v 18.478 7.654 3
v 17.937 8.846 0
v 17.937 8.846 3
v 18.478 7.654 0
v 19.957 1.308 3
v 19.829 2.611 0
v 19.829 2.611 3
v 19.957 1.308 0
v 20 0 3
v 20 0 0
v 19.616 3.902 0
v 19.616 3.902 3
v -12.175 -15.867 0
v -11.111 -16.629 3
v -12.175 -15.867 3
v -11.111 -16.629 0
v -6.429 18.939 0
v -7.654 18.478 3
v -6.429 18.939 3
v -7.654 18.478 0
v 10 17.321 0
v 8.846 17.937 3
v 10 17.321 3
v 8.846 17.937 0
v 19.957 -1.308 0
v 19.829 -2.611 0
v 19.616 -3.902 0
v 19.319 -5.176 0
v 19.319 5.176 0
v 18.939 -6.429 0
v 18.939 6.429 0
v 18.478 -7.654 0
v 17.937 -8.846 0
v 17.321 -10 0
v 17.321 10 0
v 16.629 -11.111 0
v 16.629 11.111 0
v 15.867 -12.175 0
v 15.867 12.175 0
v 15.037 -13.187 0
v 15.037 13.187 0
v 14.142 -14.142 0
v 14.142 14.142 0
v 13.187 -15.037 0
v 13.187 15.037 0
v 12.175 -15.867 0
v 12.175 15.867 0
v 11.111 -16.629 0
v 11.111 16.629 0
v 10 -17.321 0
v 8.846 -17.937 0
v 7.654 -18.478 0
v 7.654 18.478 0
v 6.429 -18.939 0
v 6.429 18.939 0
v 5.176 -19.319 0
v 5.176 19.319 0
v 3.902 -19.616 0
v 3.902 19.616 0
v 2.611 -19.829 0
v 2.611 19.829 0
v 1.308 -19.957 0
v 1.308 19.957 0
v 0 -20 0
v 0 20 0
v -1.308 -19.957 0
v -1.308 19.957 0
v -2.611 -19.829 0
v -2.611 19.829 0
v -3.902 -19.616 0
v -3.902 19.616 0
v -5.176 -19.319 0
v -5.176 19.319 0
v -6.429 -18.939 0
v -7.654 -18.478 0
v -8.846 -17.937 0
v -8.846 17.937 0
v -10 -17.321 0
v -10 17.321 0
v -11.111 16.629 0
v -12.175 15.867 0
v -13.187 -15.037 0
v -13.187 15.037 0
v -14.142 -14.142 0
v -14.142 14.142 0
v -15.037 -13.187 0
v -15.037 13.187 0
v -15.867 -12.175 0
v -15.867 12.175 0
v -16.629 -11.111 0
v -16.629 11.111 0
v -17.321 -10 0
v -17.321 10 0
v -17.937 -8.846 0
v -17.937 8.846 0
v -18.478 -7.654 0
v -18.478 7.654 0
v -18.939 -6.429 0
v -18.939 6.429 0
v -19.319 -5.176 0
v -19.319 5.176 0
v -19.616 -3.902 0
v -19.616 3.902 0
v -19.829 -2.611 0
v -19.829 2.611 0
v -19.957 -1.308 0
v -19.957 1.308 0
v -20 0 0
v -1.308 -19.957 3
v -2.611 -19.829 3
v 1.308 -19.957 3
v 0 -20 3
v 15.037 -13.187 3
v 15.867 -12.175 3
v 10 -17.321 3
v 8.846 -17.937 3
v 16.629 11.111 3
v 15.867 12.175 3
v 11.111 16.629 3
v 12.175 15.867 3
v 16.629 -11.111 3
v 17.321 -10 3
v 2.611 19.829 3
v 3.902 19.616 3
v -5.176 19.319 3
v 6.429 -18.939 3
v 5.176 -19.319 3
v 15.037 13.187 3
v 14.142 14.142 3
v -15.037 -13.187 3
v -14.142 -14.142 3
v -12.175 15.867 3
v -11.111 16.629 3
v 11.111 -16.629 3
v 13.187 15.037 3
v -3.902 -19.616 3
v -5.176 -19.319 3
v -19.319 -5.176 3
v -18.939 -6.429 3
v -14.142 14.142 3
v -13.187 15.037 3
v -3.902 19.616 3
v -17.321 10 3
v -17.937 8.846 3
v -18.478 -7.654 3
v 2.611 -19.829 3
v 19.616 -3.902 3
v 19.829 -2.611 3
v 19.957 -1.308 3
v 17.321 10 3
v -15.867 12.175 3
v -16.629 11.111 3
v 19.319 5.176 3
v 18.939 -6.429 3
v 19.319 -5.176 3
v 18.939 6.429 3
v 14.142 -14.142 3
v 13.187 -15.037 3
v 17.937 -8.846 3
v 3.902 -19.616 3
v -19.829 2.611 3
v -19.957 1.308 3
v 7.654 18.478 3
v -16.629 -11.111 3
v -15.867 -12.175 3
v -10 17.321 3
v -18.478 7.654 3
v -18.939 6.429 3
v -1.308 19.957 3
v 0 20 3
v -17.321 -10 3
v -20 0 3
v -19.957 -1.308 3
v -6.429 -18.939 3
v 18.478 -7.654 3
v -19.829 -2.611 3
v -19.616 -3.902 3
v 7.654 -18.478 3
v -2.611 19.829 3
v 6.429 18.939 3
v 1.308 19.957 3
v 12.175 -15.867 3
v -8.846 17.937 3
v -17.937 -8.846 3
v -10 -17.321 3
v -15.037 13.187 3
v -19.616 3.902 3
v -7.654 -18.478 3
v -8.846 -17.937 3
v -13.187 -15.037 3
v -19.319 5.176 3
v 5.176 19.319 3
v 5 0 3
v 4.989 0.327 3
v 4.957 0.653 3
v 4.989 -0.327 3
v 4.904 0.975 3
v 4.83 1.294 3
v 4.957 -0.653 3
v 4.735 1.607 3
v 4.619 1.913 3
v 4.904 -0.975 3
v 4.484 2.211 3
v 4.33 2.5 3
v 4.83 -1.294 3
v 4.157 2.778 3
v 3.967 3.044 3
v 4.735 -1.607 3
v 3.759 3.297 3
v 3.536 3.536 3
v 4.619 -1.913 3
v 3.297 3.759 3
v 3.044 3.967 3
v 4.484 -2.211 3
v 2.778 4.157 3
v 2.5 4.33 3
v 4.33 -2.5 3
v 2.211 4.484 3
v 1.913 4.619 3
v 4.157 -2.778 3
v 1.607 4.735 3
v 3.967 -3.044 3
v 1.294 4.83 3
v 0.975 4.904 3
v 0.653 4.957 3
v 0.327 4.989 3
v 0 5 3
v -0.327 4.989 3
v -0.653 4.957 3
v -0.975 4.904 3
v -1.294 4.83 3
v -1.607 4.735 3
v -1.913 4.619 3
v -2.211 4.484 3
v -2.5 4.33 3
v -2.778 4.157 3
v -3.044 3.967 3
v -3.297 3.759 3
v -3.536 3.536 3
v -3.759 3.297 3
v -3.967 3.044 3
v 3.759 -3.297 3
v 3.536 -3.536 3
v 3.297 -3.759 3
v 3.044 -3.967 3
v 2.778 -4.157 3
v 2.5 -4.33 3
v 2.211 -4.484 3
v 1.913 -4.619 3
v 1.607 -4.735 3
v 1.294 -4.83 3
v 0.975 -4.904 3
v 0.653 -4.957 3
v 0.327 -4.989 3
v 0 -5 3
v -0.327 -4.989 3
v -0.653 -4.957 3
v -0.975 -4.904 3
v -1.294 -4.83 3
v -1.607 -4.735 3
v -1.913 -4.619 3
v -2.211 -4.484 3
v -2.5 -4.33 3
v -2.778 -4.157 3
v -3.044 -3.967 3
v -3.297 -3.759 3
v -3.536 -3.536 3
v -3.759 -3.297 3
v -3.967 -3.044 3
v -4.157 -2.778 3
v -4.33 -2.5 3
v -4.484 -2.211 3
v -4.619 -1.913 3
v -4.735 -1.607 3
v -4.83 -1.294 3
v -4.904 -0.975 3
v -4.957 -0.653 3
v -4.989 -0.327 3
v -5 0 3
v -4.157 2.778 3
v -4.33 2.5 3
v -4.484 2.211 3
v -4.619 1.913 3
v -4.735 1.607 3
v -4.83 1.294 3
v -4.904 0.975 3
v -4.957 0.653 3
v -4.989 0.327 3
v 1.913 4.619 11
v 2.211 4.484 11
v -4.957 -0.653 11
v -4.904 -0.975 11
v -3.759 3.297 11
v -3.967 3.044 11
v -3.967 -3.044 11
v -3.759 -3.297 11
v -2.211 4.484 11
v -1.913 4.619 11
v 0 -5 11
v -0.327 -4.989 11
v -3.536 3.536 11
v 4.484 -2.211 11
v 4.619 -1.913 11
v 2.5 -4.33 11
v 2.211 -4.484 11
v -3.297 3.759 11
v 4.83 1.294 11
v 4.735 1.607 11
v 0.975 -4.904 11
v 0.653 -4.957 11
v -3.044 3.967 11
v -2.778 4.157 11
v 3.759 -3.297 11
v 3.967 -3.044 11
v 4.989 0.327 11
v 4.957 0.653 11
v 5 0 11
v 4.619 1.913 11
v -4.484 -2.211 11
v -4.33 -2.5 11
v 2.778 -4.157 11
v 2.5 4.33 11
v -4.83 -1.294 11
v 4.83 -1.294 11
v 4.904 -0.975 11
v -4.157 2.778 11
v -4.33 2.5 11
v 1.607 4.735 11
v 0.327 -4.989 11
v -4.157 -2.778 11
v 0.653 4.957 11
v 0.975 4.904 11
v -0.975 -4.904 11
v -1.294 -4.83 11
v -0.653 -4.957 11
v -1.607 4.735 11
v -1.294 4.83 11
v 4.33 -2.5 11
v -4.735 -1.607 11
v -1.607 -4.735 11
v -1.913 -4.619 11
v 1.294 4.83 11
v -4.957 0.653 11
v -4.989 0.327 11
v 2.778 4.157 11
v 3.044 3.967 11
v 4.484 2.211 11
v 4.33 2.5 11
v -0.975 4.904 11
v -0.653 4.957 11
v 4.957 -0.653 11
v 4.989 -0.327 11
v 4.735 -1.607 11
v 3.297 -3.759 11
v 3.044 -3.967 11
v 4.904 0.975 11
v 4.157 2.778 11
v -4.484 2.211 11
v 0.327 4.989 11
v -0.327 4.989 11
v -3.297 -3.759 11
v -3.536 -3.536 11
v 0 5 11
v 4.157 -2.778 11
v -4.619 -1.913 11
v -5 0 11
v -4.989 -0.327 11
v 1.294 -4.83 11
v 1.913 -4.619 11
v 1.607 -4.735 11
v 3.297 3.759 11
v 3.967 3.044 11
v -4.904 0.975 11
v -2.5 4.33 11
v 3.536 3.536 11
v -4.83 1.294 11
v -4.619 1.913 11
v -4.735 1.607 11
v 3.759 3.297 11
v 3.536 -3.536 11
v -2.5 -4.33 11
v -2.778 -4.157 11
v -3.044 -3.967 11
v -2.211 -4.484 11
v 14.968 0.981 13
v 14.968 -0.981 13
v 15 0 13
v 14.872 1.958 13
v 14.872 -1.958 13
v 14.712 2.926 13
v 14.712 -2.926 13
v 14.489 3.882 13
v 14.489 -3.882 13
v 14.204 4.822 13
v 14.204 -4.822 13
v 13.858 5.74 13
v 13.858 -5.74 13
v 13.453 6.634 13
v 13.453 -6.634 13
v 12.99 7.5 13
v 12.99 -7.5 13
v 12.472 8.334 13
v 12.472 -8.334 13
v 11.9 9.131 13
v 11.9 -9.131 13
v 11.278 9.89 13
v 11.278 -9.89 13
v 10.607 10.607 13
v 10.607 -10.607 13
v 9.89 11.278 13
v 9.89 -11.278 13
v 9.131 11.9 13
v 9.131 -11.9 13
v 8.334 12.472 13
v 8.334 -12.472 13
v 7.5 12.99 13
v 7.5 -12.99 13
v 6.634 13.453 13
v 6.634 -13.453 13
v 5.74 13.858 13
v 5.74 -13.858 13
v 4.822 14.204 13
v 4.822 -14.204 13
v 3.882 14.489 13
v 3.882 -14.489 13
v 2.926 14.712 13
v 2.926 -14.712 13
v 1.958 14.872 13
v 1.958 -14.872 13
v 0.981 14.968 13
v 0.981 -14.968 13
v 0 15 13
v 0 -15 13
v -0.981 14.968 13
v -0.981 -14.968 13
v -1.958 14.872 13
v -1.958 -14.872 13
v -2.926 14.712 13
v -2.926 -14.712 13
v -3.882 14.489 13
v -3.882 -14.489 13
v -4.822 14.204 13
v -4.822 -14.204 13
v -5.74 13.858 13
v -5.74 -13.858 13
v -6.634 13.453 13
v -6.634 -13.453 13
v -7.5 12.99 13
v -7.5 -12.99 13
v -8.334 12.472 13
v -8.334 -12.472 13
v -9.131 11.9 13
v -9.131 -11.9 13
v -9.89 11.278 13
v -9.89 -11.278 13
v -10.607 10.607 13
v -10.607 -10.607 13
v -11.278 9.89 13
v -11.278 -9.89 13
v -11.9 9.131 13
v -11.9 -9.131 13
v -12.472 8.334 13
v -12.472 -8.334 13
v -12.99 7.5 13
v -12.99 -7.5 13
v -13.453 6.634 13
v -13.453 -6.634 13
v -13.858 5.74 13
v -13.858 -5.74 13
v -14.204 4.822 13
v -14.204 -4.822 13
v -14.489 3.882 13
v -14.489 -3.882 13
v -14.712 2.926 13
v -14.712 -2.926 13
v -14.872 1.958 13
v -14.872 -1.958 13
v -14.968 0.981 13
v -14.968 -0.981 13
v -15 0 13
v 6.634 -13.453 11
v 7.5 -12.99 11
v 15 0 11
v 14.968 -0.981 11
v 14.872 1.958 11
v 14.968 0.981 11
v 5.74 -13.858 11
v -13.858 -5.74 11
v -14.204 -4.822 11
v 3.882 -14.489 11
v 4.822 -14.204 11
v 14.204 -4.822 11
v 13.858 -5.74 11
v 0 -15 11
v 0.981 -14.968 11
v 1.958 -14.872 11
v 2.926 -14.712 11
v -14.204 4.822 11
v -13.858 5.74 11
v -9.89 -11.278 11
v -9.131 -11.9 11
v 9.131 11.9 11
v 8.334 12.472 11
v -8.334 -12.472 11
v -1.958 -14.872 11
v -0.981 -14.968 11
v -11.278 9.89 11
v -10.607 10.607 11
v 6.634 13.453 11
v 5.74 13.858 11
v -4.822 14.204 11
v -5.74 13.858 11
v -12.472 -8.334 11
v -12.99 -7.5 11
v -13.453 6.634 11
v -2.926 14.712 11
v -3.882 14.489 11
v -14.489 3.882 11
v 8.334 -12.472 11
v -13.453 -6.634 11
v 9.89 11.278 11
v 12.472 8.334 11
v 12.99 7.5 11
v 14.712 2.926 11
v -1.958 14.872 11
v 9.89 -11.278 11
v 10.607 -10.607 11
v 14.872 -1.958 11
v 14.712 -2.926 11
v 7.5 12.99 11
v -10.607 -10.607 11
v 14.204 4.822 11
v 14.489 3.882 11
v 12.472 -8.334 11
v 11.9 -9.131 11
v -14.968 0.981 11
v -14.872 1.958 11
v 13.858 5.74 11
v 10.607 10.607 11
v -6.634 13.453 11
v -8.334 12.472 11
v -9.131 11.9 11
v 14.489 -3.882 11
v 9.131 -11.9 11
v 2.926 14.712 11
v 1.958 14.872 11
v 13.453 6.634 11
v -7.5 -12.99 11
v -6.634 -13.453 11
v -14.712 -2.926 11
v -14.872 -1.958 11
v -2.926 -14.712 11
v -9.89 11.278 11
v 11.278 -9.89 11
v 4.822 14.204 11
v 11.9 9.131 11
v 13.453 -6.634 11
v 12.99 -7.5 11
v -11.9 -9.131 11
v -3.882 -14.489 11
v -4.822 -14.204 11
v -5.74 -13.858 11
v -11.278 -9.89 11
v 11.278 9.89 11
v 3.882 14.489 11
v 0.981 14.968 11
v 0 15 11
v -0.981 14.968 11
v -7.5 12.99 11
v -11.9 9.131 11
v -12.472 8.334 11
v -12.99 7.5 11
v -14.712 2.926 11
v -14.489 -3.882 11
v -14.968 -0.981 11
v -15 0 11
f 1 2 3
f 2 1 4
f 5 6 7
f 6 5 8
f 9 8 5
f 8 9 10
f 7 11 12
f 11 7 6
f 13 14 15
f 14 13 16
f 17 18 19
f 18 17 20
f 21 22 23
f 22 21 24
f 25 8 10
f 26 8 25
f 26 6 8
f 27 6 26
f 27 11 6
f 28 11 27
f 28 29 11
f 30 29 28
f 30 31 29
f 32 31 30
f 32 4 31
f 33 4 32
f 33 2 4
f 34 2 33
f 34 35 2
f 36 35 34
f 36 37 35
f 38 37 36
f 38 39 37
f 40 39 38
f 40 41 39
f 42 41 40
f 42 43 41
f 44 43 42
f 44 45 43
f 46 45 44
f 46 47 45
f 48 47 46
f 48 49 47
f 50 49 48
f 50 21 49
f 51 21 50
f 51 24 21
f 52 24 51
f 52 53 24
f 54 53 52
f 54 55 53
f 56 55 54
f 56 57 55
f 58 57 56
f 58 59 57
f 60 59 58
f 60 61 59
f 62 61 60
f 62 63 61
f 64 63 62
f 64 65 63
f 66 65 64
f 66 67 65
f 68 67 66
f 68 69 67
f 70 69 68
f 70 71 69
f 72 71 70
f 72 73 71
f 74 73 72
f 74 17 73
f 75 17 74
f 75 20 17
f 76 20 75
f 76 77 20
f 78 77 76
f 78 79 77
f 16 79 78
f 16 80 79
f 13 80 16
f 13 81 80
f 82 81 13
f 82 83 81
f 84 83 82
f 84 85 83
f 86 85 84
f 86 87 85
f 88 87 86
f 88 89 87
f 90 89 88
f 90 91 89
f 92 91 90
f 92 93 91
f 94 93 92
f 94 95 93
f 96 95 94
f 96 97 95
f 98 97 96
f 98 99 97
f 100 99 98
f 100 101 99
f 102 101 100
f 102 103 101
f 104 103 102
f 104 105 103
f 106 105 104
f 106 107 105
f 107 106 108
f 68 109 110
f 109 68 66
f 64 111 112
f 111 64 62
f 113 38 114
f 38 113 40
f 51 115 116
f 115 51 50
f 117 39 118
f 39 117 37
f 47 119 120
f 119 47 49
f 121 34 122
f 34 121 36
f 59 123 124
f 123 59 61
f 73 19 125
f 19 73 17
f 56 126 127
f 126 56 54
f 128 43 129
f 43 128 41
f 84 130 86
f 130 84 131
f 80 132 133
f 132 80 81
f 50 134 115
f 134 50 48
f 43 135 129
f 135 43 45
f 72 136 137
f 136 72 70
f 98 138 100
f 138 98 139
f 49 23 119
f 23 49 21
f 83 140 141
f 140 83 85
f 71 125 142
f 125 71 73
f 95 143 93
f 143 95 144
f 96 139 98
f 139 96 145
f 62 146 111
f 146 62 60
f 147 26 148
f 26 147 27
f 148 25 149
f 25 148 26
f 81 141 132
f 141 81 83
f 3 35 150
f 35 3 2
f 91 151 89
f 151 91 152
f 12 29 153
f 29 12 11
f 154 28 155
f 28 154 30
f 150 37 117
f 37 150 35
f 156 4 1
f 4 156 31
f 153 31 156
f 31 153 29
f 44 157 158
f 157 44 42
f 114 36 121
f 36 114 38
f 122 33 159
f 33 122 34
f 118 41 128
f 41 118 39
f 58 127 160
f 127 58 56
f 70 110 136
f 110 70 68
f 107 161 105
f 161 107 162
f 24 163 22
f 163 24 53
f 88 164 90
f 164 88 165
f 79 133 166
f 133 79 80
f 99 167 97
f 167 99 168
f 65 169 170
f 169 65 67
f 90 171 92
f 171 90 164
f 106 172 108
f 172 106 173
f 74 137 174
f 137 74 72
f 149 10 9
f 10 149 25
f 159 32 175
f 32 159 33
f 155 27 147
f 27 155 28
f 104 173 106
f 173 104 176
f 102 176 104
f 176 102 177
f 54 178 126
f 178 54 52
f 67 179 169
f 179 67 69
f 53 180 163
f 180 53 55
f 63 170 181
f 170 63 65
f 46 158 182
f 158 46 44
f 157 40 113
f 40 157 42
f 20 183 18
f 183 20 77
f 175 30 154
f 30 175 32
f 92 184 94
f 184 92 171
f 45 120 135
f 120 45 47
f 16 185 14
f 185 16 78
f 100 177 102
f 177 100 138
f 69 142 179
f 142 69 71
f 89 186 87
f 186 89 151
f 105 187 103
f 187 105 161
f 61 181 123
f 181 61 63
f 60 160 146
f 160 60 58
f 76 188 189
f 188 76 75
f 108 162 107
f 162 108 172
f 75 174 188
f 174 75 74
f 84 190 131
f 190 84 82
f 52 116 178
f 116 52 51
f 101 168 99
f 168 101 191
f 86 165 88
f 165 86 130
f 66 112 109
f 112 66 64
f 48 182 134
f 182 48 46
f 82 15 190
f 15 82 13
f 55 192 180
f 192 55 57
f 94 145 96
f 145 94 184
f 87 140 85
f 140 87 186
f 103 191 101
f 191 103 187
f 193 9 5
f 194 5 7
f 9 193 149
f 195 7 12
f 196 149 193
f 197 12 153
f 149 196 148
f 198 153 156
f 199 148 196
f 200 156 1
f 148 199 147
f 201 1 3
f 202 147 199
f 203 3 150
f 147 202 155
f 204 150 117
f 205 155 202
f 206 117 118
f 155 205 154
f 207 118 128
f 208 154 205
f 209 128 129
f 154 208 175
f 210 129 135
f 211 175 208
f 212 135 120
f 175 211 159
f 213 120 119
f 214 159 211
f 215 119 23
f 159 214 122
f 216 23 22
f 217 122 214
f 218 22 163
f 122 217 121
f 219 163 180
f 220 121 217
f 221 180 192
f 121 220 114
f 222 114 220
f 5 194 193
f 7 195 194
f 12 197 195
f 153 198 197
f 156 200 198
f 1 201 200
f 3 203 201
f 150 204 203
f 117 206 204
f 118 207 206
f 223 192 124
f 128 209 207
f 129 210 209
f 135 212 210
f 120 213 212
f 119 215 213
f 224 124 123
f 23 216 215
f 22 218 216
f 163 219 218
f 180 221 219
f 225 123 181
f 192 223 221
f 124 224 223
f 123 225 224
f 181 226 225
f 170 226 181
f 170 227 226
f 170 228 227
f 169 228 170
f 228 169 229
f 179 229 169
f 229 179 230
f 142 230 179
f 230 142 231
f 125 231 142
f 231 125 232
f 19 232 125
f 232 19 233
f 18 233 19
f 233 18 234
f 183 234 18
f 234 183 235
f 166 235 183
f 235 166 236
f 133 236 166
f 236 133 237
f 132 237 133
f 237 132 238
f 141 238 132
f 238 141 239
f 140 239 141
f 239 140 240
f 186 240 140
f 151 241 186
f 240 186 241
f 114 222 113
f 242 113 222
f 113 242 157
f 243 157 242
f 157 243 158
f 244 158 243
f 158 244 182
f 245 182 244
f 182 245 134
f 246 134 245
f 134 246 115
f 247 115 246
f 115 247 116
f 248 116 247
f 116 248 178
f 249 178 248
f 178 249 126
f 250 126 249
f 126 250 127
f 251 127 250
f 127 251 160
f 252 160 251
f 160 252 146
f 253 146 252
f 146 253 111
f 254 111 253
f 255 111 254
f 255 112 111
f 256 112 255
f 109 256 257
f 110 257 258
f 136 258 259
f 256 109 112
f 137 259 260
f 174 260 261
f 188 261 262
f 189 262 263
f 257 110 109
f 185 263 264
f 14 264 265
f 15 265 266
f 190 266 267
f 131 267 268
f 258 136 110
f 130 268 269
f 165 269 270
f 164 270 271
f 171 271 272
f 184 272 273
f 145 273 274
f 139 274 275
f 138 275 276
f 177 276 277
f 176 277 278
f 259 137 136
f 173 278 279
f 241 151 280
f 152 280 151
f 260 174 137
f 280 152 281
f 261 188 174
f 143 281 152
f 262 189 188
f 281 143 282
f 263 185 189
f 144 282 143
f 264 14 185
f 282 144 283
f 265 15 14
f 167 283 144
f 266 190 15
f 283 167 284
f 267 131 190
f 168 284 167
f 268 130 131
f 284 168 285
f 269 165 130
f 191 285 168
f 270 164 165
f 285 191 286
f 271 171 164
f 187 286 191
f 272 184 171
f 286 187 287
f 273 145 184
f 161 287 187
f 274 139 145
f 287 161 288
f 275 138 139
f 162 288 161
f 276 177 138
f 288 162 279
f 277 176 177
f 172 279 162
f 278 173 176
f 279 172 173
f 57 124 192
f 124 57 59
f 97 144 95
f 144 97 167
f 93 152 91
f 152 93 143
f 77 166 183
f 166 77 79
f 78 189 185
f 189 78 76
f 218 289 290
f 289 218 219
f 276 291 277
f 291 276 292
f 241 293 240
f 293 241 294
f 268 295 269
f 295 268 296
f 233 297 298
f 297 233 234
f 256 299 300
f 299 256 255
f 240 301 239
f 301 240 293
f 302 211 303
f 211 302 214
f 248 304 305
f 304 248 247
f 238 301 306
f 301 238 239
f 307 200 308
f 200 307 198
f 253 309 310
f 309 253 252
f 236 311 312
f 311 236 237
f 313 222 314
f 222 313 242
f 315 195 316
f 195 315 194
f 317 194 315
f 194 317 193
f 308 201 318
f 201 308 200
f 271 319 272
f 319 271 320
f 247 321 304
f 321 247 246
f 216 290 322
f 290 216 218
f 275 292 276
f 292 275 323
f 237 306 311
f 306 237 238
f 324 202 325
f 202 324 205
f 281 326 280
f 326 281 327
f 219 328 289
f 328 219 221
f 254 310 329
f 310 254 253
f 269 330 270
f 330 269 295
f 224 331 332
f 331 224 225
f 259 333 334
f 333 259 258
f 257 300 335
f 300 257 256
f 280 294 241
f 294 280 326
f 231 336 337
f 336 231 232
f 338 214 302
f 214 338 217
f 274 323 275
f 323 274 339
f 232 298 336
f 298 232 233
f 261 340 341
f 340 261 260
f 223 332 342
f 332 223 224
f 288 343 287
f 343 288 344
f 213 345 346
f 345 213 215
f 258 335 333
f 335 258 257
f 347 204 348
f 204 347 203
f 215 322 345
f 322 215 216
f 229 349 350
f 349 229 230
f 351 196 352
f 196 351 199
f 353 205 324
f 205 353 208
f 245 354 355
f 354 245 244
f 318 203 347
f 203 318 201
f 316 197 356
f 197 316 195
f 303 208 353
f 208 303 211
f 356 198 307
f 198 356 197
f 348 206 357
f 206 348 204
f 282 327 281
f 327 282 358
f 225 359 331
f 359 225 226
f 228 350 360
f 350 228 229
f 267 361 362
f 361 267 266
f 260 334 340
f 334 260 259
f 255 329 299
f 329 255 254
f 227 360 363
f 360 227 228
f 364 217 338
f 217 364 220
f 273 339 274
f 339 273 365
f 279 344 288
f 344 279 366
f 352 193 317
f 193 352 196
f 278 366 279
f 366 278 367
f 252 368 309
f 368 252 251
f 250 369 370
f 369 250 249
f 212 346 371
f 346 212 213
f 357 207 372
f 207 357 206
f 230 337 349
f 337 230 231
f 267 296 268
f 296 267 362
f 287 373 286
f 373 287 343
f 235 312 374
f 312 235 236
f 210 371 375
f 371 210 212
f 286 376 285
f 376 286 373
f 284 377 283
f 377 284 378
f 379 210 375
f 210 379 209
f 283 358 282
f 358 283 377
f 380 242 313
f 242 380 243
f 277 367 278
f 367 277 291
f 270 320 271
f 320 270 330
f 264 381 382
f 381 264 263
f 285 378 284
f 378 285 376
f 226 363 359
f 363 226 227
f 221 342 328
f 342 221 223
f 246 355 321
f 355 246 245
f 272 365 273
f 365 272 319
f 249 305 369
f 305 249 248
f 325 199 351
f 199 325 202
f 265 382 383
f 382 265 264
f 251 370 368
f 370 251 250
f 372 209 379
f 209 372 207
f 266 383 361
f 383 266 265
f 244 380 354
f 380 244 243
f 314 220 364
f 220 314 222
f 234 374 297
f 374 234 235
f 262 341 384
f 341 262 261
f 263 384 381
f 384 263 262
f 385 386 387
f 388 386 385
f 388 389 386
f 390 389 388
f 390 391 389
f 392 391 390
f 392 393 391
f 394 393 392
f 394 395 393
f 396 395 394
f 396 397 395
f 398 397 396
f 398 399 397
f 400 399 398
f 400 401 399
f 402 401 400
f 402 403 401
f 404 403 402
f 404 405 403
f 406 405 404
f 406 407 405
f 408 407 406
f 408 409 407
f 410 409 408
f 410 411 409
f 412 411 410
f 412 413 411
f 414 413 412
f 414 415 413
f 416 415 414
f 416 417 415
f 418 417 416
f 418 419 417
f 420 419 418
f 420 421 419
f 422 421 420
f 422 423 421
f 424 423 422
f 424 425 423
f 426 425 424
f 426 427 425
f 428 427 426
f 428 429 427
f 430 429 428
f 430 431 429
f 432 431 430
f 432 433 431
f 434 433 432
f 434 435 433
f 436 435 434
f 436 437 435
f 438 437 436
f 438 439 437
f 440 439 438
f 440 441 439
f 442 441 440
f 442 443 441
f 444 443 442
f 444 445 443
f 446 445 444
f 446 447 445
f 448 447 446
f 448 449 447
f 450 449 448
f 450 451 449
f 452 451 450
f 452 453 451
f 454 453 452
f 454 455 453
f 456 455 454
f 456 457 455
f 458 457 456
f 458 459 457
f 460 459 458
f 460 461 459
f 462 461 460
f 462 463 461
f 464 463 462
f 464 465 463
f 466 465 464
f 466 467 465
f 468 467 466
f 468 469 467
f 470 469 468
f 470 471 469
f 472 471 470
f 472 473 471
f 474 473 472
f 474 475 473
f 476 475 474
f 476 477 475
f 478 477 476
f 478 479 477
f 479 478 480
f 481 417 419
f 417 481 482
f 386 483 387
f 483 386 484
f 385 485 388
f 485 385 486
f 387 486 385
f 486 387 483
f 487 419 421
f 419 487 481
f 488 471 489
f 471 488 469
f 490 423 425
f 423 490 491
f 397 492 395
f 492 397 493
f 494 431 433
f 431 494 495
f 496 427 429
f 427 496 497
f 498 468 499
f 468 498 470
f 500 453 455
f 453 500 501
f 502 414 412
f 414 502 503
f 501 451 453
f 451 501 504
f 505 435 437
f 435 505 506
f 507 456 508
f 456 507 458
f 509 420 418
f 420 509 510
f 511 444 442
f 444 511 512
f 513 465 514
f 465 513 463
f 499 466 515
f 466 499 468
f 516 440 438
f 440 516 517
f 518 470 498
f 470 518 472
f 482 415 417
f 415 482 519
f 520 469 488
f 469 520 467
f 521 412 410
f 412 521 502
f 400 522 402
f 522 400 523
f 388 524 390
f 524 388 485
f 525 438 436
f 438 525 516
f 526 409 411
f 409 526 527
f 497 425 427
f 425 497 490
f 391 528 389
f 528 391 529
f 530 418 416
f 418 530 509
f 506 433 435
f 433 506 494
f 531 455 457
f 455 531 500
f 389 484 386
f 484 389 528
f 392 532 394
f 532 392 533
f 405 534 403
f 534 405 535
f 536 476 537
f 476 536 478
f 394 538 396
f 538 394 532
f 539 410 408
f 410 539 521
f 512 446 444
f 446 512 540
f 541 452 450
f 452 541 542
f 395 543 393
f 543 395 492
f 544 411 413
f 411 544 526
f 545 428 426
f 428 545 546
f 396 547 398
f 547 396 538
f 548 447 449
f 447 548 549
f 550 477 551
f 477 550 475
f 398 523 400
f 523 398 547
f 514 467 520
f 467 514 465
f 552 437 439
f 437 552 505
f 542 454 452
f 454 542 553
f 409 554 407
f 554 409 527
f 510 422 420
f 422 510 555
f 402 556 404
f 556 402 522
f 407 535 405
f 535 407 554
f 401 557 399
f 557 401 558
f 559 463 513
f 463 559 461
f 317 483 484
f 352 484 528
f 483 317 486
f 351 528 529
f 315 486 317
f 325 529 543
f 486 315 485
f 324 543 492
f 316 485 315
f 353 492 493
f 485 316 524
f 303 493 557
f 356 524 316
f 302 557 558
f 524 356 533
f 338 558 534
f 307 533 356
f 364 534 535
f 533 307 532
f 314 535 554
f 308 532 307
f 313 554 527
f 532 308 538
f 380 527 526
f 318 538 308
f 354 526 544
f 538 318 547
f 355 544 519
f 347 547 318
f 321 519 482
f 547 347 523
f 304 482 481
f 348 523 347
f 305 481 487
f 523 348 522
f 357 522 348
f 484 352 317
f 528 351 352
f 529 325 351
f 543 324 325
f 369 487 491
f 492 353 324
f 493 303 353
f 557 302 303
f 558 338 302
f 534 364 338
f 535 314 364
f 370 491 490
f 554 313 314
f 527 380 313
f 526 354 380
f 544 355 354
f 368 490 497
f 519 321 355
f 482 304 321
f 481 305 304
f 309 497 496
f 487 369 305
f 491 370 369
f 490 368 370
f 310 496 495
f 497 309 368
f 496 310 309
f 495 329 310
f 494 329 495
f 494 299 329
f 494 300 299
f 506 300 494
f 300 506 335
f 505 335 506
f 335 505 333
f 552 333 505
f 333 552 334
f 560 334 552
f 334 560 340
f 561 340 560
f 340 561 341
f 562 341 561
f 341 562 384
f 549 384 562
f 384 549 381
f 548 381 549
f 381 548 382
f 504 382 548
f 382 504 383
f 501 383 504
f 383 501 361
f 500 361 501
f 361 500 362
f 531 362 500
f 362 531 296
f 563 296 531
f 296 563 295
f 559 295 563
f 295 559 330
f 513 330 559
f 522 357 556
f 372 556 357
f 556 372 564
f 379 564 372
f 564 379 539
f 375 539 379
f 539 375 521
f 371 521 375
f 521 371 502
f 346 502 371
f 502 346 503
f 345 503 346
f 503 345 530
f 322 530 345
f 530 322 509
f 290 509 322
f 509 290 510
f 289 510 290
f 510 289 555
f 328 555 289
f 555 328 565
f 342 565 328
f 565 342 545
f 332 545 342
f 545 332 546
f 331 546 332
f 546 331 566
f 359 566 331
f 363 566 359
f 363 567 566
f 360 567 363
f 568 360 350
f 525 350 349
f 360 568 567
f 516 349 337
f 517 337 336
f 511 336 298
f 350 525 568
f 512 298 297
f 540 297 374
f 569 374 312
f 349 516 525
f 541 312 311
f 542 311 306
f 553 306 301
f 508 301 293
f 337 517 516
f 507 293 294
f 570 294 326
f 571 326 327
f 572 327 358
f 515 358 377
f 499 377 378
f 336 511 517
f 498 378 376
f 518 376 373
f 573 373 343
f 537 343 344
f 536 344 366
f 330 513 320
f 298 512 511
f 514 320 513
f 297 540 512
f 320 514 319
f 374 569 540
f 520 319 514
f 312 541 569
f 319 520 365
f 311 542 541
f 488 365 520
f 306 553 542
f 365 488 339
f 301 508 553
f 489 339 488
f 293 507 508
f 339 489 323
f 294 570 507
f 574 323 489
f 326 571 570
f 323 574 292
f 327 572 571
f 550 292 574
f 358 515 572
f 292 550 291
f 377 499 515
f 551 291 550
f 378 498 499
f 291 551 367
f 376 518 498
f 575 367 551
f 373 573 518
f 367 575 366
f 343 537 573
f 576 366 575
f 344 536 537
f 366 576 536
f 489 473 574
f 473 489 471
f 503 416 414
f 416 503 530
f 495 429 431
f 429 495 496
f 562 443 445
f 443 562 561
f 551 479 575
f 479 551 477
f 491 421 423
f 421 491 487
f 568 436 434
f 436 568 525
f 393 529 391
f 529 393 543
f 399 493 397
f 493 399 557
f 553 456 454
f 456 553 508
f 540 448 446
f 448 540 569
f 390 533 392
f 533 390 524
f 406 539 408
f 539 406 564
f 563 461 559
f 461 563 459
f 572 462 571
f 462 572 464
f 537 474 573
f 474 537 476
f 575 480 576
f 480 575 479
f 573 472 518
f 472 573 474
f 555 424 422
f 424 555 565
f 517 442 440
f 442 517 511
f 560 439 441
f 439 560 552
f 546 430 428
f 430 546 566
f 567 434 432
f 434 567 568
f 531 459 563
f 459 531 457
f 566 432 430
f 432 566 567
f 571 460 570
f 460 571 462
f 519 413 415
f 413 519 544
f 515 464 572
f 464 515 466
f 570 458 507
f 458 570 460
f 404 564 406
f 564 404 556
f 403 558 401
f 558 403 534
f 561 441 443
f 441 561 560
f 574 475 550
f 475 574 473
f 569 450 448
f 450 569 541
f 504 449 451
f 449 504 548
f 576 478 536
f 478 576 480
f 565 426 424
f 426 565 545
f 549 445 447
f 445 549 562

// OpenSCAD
// same mushroom raised on a wider pad r20 h3: column ends on the pad top (drop 8), 628.3*8 = 5027 mm^3.
$fn = 96;
cylinder(h = 3, r = 20);
cylinder(h = 13, r = 5);
translate([0,0,11]) cylinder(h = 2, r = 15);
